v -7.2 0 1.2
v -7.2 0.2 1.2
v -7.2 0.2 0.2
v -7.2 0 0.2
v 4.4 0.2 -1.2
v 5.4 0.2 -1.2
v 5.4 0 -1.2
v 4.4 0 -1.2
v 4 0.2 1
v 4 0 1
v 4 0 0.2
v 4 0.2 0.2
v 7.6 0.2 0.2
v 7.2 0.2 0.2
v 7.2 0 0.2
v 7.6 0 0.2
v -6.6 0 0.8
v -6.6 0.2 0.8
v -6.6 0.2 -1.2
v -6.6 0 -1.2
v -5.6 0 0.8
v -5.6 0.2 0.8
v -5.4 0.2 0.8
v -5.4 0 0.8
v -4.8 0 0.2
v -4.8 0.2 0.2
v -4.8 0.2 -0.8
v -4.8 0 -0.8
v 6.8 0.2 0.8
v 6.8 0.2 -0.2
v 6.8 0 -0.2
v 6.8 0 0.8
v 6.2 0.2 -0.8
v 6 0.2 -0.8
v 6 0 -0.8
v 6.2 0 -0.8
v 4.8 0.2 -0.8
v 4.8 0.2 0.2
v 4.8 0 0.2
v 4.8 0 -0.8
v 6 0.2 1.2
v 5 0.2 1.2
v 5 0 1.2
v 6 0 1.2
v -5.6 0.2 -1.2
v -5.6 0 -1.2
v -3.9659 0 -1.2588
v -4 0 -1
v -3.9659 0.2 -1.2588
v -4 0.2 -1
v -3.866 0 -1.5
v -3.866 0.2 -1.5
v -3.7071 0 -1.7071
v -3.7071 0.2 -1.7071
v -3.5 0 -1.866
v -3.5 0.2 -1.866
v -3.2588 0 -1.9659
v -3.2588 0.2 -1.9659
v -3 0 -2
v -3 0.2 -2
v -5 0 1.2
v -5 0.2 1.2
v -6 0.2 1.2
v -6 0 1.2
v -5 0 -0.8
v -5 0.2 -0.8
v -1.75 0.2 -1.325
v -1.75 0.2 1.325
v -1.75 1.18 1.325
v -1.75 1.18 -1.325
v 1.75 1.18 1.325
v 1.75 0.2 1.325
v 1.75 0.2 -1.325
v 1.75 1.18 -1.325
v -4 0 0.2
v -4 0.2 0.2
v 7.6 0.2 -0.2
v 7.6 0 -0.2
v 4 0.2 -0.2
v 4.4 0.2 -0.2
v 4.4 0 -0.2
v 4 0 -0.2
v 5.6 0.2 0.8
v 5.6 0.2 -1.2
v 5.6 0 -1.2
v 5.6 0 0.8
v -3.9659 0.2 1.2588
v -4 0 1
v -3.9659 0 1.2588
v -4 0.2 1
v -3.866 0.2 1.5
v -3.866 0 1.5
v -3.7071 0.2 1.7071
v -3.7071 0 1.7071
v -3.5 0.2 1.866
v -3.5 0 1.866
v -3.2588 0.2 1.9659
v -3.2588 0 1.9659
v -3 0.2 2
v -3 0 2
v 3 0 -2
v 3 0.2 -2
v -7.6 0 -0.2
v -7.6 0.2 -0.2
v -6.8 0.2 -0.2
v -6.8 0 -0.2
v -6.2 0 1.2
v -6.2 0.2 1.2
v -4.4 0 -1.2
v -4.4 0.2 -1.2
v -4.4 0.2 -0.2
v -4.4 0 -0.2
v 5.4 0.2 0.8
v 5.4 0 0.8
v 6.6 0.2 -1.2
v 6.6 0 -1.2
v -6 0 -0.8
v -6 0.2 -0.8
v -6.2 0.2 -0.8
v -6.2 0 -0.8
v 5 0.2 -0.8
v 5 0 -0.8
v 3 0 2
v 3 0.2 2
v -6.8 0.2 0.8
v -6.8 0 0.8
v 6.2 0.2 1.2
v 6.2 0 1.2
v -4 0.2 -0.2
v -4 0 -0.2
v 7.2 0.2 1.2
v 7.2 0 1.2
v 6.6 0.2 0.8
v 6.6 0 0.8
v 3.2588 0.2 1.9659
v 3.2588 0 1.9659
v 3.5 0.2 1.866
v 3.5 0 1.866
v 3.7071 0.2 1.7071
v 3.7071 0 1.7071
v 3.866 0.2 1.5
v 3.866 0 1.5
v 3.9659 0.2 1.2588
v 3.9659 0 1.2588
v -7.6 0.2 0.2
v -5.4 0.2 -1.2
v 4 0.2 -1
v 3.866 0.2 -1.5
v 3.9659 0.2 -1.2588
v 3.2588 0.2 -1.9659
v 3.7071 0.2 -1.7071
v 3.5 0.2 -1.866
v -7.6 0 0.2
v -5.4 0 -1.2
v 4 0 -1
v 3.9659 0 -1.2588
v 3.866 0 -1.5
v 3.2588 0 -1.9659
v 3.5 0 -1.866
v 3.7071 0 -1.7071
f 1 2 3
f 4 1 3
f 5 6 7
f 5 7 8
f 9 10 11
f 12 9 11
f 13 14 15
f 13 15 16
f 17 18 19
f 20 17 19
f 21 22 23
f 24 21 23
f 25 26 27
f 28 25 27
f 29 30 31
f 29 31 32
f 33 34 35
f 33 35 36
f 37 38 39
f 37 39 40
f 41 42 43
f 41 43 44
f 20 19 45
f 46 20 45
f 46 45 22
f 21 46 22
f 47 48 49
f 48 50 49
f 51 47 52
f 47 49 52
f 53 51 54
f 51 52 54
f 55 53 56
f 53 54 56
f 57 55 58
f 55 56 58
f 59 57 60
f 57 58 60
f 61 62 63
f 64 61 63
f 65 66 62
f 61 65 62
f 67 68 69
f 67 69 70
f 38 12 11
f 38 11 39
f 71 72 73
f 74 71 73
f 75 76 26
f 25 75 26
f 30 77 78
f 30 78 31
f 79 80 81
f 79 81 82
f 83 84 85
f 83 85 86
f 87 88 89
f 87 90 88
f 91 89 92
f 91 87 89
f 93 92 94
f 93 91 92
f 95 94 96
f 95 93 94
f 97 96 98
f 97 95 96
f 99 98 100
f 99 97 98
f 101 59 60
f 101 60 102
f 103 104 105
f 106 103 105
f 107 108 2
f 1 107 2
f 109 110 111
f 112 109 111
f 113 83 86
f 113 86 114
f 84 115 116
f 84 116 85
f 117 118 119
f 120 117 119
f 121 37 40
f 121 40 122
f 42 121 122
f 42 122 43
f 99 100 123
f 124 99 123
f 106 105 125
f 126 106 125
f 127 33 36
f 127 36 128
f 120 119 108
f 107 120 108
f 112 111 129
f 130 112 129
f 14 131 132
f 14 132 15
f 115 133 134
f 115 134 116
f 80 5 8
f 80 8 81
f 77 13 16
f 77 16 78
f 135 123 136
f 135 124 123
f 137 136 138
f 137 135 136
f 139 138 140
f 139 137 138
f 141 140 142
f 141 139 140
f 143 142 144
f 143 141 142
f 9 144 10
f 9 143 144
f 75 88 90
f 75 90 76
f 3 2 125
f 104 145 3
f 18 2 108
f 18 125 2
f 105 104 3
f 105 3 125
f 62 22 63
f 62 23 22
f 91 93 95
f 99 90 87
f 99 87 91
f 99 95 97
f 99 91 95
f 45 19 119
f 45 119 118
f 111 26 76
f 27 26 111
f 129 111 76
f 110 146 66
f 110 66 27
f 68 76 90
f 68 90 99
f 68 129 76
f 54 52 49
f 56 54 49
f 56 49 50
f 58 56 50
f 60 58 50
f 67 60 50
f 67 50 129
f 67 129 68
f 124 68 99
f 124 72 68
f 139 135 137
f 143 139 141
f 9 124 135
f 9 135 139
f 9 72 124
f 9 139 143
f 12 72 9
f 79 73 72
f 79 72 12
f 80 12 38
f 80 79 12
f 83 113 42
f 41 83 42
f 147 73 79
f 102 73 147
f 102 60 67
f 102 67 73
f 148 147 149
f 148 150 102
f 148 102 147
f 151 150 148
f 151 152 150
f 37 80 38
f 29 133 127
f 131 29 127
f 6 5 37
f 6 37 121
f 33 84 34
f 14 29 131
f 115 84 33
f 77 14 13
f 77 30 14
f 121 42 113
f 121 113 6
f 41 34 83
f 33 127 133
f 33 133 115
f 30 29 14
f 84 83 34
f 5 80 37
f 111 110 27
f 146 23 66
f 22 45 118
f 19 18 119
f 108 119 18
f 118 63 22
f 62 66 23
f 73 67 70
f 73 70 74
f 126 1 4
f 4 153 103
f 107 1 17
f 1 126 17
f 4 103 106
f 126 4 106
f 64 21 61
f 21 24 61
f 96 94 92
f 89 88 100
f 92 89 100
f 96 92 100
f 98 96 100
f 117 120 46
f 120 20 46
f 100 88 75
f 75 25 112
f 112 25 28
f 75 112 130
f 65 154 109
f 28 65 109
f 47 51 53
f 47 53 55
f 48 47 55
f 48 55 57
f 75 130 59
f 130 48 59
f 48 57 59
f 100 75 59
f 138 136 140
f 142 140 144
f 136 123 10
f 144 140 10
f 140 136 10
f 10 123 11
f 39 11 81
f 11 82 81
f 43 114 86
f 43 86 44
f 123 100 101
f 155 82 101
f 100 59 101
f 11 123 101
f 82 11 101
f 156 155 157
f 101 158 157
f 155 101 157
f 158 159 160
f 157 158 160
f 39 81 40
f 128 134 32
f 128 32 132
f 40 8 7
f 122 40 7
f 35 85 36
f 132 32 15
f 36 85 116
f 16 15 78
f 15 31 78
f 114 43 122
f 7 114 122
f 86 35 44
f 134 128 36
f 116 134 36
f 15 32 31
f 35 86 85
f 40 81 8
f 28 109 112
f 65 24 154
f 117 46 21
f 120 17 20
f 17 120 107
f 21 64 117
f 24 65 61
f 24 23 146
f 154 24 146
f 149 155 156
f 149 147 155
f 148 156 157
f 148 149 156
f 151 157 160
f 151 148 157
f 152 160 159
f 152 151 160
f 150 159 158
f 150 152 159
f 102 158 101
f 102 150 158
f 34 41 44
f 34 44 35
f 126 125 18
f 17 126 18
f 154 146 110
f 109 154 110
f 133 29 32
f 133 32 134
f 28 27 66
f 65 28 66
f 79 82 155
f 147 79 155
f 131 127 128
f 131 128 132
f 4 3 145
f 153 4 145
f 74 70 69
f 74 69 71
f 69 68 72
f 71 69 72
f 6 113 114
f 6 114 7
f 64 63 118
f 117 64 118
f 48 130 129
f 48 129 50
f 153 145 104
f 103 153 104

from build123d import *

# Parameters (mm, degrees)
SKETCH1_W           = 8
SKETCH1_H           = 4
BOSS_EXTRUDE1_DEPTH = 0.2
FILLET1_R           = 1
BOSS_EXTRUDE2_DEPTH = 0.2
SKETCH3_W           = 3.5
SKETCH3_H           = 2.65
BOSS_EXTRUDE3_DEPTH = 0.98


with BuildPart() as part:
    # Sketch1 → Boss-Extrude1 (new body)
    with BuildSketch(Plane(origin=(0, 0, 0), x_dir=(1, 0, 0), z_dir=(0, 1, 0))):
        Rectangle(SKETCH1_W, SKETCH1_H)
    extrude(amount=BOSS_EXTRUDE1_DEPTH)

    # Fillet1
    fillet1_edges = [part.edges().sort_by_distance(p)[0] for p in [
        (4, 0.1, 2),
        (-4, 0.1, 2),
        (-4, 0.1, -2),
        (4, 0.1, -2),
    ]]
    fillet(fillet1_edges, radius=FILLET1_R)

    # Sketch2 → Boss-Extrude2 (add)
    with BuildSketch(Plane(origin=(0, 0.2, 0), x_dir=(1, 0, 0), z_dir=(0, 1, 0))):
        Polygon((4, 0.2), (4, 0), (4.6, 0), (4.6, 1), (5.2, 1), (5.2, -1), (5.8, -1), (5.8, 1), (6.4, 1), (6.4, -1), (7, -1), (7, 0), (7.6, 0), (7.6, 0.2), (6.8, 0.2), (6.8, -0.8), (6.6, -0.8), (6.6, 1.2), (5.6, 1.2), (5.6, -0.8), (5.4, -0.8), (5.4, 1.2), (4.4, 1.2), (4.4, 0.2), align=None)
        Polygon((4.6, 0), (4, 0), (4, -0.2), (4.8, -0.2), (4.8, 0.8), (5, 0.8), (5, -1.2), (6, -1.2), (6, 0.8), (6.2, 0.8), (6.2, -1.2), (7.2, -1.2), (7.2, -0.2), (7.6, -0.2), (7.6, 0), (7, 0), (7, -1), (6.4, -1), (6.4, 1), (5.8, 1), (5.8, -1), (5.2, -1), (5.2, 1), (4.6, 1), align=None)
    boss_extrude2 = extrude(amount=-BOSS_EXTRUDE2_DEPTH)

    # Mirror1: Boss-Extrude2 across plane
    add(boss_extrude2.mirror(Plane(origin=(0, 0, 0), x_dir=(0, 0, 1), z_dir=(1, 0, 0))))

    # Sketch3 → Boss-Extrude3 (add)
    with BuildSketch(Plane(origin=(0, 0.2, 0), x_dir=(1, 0, 0), z_dir=(0, 1, 0))):
        Rectangle(SKETCH3_W, SKETCH3_H)
    extrude(amount=BOSS_EXTRUDE3_DEPTH)


solid = part.part
